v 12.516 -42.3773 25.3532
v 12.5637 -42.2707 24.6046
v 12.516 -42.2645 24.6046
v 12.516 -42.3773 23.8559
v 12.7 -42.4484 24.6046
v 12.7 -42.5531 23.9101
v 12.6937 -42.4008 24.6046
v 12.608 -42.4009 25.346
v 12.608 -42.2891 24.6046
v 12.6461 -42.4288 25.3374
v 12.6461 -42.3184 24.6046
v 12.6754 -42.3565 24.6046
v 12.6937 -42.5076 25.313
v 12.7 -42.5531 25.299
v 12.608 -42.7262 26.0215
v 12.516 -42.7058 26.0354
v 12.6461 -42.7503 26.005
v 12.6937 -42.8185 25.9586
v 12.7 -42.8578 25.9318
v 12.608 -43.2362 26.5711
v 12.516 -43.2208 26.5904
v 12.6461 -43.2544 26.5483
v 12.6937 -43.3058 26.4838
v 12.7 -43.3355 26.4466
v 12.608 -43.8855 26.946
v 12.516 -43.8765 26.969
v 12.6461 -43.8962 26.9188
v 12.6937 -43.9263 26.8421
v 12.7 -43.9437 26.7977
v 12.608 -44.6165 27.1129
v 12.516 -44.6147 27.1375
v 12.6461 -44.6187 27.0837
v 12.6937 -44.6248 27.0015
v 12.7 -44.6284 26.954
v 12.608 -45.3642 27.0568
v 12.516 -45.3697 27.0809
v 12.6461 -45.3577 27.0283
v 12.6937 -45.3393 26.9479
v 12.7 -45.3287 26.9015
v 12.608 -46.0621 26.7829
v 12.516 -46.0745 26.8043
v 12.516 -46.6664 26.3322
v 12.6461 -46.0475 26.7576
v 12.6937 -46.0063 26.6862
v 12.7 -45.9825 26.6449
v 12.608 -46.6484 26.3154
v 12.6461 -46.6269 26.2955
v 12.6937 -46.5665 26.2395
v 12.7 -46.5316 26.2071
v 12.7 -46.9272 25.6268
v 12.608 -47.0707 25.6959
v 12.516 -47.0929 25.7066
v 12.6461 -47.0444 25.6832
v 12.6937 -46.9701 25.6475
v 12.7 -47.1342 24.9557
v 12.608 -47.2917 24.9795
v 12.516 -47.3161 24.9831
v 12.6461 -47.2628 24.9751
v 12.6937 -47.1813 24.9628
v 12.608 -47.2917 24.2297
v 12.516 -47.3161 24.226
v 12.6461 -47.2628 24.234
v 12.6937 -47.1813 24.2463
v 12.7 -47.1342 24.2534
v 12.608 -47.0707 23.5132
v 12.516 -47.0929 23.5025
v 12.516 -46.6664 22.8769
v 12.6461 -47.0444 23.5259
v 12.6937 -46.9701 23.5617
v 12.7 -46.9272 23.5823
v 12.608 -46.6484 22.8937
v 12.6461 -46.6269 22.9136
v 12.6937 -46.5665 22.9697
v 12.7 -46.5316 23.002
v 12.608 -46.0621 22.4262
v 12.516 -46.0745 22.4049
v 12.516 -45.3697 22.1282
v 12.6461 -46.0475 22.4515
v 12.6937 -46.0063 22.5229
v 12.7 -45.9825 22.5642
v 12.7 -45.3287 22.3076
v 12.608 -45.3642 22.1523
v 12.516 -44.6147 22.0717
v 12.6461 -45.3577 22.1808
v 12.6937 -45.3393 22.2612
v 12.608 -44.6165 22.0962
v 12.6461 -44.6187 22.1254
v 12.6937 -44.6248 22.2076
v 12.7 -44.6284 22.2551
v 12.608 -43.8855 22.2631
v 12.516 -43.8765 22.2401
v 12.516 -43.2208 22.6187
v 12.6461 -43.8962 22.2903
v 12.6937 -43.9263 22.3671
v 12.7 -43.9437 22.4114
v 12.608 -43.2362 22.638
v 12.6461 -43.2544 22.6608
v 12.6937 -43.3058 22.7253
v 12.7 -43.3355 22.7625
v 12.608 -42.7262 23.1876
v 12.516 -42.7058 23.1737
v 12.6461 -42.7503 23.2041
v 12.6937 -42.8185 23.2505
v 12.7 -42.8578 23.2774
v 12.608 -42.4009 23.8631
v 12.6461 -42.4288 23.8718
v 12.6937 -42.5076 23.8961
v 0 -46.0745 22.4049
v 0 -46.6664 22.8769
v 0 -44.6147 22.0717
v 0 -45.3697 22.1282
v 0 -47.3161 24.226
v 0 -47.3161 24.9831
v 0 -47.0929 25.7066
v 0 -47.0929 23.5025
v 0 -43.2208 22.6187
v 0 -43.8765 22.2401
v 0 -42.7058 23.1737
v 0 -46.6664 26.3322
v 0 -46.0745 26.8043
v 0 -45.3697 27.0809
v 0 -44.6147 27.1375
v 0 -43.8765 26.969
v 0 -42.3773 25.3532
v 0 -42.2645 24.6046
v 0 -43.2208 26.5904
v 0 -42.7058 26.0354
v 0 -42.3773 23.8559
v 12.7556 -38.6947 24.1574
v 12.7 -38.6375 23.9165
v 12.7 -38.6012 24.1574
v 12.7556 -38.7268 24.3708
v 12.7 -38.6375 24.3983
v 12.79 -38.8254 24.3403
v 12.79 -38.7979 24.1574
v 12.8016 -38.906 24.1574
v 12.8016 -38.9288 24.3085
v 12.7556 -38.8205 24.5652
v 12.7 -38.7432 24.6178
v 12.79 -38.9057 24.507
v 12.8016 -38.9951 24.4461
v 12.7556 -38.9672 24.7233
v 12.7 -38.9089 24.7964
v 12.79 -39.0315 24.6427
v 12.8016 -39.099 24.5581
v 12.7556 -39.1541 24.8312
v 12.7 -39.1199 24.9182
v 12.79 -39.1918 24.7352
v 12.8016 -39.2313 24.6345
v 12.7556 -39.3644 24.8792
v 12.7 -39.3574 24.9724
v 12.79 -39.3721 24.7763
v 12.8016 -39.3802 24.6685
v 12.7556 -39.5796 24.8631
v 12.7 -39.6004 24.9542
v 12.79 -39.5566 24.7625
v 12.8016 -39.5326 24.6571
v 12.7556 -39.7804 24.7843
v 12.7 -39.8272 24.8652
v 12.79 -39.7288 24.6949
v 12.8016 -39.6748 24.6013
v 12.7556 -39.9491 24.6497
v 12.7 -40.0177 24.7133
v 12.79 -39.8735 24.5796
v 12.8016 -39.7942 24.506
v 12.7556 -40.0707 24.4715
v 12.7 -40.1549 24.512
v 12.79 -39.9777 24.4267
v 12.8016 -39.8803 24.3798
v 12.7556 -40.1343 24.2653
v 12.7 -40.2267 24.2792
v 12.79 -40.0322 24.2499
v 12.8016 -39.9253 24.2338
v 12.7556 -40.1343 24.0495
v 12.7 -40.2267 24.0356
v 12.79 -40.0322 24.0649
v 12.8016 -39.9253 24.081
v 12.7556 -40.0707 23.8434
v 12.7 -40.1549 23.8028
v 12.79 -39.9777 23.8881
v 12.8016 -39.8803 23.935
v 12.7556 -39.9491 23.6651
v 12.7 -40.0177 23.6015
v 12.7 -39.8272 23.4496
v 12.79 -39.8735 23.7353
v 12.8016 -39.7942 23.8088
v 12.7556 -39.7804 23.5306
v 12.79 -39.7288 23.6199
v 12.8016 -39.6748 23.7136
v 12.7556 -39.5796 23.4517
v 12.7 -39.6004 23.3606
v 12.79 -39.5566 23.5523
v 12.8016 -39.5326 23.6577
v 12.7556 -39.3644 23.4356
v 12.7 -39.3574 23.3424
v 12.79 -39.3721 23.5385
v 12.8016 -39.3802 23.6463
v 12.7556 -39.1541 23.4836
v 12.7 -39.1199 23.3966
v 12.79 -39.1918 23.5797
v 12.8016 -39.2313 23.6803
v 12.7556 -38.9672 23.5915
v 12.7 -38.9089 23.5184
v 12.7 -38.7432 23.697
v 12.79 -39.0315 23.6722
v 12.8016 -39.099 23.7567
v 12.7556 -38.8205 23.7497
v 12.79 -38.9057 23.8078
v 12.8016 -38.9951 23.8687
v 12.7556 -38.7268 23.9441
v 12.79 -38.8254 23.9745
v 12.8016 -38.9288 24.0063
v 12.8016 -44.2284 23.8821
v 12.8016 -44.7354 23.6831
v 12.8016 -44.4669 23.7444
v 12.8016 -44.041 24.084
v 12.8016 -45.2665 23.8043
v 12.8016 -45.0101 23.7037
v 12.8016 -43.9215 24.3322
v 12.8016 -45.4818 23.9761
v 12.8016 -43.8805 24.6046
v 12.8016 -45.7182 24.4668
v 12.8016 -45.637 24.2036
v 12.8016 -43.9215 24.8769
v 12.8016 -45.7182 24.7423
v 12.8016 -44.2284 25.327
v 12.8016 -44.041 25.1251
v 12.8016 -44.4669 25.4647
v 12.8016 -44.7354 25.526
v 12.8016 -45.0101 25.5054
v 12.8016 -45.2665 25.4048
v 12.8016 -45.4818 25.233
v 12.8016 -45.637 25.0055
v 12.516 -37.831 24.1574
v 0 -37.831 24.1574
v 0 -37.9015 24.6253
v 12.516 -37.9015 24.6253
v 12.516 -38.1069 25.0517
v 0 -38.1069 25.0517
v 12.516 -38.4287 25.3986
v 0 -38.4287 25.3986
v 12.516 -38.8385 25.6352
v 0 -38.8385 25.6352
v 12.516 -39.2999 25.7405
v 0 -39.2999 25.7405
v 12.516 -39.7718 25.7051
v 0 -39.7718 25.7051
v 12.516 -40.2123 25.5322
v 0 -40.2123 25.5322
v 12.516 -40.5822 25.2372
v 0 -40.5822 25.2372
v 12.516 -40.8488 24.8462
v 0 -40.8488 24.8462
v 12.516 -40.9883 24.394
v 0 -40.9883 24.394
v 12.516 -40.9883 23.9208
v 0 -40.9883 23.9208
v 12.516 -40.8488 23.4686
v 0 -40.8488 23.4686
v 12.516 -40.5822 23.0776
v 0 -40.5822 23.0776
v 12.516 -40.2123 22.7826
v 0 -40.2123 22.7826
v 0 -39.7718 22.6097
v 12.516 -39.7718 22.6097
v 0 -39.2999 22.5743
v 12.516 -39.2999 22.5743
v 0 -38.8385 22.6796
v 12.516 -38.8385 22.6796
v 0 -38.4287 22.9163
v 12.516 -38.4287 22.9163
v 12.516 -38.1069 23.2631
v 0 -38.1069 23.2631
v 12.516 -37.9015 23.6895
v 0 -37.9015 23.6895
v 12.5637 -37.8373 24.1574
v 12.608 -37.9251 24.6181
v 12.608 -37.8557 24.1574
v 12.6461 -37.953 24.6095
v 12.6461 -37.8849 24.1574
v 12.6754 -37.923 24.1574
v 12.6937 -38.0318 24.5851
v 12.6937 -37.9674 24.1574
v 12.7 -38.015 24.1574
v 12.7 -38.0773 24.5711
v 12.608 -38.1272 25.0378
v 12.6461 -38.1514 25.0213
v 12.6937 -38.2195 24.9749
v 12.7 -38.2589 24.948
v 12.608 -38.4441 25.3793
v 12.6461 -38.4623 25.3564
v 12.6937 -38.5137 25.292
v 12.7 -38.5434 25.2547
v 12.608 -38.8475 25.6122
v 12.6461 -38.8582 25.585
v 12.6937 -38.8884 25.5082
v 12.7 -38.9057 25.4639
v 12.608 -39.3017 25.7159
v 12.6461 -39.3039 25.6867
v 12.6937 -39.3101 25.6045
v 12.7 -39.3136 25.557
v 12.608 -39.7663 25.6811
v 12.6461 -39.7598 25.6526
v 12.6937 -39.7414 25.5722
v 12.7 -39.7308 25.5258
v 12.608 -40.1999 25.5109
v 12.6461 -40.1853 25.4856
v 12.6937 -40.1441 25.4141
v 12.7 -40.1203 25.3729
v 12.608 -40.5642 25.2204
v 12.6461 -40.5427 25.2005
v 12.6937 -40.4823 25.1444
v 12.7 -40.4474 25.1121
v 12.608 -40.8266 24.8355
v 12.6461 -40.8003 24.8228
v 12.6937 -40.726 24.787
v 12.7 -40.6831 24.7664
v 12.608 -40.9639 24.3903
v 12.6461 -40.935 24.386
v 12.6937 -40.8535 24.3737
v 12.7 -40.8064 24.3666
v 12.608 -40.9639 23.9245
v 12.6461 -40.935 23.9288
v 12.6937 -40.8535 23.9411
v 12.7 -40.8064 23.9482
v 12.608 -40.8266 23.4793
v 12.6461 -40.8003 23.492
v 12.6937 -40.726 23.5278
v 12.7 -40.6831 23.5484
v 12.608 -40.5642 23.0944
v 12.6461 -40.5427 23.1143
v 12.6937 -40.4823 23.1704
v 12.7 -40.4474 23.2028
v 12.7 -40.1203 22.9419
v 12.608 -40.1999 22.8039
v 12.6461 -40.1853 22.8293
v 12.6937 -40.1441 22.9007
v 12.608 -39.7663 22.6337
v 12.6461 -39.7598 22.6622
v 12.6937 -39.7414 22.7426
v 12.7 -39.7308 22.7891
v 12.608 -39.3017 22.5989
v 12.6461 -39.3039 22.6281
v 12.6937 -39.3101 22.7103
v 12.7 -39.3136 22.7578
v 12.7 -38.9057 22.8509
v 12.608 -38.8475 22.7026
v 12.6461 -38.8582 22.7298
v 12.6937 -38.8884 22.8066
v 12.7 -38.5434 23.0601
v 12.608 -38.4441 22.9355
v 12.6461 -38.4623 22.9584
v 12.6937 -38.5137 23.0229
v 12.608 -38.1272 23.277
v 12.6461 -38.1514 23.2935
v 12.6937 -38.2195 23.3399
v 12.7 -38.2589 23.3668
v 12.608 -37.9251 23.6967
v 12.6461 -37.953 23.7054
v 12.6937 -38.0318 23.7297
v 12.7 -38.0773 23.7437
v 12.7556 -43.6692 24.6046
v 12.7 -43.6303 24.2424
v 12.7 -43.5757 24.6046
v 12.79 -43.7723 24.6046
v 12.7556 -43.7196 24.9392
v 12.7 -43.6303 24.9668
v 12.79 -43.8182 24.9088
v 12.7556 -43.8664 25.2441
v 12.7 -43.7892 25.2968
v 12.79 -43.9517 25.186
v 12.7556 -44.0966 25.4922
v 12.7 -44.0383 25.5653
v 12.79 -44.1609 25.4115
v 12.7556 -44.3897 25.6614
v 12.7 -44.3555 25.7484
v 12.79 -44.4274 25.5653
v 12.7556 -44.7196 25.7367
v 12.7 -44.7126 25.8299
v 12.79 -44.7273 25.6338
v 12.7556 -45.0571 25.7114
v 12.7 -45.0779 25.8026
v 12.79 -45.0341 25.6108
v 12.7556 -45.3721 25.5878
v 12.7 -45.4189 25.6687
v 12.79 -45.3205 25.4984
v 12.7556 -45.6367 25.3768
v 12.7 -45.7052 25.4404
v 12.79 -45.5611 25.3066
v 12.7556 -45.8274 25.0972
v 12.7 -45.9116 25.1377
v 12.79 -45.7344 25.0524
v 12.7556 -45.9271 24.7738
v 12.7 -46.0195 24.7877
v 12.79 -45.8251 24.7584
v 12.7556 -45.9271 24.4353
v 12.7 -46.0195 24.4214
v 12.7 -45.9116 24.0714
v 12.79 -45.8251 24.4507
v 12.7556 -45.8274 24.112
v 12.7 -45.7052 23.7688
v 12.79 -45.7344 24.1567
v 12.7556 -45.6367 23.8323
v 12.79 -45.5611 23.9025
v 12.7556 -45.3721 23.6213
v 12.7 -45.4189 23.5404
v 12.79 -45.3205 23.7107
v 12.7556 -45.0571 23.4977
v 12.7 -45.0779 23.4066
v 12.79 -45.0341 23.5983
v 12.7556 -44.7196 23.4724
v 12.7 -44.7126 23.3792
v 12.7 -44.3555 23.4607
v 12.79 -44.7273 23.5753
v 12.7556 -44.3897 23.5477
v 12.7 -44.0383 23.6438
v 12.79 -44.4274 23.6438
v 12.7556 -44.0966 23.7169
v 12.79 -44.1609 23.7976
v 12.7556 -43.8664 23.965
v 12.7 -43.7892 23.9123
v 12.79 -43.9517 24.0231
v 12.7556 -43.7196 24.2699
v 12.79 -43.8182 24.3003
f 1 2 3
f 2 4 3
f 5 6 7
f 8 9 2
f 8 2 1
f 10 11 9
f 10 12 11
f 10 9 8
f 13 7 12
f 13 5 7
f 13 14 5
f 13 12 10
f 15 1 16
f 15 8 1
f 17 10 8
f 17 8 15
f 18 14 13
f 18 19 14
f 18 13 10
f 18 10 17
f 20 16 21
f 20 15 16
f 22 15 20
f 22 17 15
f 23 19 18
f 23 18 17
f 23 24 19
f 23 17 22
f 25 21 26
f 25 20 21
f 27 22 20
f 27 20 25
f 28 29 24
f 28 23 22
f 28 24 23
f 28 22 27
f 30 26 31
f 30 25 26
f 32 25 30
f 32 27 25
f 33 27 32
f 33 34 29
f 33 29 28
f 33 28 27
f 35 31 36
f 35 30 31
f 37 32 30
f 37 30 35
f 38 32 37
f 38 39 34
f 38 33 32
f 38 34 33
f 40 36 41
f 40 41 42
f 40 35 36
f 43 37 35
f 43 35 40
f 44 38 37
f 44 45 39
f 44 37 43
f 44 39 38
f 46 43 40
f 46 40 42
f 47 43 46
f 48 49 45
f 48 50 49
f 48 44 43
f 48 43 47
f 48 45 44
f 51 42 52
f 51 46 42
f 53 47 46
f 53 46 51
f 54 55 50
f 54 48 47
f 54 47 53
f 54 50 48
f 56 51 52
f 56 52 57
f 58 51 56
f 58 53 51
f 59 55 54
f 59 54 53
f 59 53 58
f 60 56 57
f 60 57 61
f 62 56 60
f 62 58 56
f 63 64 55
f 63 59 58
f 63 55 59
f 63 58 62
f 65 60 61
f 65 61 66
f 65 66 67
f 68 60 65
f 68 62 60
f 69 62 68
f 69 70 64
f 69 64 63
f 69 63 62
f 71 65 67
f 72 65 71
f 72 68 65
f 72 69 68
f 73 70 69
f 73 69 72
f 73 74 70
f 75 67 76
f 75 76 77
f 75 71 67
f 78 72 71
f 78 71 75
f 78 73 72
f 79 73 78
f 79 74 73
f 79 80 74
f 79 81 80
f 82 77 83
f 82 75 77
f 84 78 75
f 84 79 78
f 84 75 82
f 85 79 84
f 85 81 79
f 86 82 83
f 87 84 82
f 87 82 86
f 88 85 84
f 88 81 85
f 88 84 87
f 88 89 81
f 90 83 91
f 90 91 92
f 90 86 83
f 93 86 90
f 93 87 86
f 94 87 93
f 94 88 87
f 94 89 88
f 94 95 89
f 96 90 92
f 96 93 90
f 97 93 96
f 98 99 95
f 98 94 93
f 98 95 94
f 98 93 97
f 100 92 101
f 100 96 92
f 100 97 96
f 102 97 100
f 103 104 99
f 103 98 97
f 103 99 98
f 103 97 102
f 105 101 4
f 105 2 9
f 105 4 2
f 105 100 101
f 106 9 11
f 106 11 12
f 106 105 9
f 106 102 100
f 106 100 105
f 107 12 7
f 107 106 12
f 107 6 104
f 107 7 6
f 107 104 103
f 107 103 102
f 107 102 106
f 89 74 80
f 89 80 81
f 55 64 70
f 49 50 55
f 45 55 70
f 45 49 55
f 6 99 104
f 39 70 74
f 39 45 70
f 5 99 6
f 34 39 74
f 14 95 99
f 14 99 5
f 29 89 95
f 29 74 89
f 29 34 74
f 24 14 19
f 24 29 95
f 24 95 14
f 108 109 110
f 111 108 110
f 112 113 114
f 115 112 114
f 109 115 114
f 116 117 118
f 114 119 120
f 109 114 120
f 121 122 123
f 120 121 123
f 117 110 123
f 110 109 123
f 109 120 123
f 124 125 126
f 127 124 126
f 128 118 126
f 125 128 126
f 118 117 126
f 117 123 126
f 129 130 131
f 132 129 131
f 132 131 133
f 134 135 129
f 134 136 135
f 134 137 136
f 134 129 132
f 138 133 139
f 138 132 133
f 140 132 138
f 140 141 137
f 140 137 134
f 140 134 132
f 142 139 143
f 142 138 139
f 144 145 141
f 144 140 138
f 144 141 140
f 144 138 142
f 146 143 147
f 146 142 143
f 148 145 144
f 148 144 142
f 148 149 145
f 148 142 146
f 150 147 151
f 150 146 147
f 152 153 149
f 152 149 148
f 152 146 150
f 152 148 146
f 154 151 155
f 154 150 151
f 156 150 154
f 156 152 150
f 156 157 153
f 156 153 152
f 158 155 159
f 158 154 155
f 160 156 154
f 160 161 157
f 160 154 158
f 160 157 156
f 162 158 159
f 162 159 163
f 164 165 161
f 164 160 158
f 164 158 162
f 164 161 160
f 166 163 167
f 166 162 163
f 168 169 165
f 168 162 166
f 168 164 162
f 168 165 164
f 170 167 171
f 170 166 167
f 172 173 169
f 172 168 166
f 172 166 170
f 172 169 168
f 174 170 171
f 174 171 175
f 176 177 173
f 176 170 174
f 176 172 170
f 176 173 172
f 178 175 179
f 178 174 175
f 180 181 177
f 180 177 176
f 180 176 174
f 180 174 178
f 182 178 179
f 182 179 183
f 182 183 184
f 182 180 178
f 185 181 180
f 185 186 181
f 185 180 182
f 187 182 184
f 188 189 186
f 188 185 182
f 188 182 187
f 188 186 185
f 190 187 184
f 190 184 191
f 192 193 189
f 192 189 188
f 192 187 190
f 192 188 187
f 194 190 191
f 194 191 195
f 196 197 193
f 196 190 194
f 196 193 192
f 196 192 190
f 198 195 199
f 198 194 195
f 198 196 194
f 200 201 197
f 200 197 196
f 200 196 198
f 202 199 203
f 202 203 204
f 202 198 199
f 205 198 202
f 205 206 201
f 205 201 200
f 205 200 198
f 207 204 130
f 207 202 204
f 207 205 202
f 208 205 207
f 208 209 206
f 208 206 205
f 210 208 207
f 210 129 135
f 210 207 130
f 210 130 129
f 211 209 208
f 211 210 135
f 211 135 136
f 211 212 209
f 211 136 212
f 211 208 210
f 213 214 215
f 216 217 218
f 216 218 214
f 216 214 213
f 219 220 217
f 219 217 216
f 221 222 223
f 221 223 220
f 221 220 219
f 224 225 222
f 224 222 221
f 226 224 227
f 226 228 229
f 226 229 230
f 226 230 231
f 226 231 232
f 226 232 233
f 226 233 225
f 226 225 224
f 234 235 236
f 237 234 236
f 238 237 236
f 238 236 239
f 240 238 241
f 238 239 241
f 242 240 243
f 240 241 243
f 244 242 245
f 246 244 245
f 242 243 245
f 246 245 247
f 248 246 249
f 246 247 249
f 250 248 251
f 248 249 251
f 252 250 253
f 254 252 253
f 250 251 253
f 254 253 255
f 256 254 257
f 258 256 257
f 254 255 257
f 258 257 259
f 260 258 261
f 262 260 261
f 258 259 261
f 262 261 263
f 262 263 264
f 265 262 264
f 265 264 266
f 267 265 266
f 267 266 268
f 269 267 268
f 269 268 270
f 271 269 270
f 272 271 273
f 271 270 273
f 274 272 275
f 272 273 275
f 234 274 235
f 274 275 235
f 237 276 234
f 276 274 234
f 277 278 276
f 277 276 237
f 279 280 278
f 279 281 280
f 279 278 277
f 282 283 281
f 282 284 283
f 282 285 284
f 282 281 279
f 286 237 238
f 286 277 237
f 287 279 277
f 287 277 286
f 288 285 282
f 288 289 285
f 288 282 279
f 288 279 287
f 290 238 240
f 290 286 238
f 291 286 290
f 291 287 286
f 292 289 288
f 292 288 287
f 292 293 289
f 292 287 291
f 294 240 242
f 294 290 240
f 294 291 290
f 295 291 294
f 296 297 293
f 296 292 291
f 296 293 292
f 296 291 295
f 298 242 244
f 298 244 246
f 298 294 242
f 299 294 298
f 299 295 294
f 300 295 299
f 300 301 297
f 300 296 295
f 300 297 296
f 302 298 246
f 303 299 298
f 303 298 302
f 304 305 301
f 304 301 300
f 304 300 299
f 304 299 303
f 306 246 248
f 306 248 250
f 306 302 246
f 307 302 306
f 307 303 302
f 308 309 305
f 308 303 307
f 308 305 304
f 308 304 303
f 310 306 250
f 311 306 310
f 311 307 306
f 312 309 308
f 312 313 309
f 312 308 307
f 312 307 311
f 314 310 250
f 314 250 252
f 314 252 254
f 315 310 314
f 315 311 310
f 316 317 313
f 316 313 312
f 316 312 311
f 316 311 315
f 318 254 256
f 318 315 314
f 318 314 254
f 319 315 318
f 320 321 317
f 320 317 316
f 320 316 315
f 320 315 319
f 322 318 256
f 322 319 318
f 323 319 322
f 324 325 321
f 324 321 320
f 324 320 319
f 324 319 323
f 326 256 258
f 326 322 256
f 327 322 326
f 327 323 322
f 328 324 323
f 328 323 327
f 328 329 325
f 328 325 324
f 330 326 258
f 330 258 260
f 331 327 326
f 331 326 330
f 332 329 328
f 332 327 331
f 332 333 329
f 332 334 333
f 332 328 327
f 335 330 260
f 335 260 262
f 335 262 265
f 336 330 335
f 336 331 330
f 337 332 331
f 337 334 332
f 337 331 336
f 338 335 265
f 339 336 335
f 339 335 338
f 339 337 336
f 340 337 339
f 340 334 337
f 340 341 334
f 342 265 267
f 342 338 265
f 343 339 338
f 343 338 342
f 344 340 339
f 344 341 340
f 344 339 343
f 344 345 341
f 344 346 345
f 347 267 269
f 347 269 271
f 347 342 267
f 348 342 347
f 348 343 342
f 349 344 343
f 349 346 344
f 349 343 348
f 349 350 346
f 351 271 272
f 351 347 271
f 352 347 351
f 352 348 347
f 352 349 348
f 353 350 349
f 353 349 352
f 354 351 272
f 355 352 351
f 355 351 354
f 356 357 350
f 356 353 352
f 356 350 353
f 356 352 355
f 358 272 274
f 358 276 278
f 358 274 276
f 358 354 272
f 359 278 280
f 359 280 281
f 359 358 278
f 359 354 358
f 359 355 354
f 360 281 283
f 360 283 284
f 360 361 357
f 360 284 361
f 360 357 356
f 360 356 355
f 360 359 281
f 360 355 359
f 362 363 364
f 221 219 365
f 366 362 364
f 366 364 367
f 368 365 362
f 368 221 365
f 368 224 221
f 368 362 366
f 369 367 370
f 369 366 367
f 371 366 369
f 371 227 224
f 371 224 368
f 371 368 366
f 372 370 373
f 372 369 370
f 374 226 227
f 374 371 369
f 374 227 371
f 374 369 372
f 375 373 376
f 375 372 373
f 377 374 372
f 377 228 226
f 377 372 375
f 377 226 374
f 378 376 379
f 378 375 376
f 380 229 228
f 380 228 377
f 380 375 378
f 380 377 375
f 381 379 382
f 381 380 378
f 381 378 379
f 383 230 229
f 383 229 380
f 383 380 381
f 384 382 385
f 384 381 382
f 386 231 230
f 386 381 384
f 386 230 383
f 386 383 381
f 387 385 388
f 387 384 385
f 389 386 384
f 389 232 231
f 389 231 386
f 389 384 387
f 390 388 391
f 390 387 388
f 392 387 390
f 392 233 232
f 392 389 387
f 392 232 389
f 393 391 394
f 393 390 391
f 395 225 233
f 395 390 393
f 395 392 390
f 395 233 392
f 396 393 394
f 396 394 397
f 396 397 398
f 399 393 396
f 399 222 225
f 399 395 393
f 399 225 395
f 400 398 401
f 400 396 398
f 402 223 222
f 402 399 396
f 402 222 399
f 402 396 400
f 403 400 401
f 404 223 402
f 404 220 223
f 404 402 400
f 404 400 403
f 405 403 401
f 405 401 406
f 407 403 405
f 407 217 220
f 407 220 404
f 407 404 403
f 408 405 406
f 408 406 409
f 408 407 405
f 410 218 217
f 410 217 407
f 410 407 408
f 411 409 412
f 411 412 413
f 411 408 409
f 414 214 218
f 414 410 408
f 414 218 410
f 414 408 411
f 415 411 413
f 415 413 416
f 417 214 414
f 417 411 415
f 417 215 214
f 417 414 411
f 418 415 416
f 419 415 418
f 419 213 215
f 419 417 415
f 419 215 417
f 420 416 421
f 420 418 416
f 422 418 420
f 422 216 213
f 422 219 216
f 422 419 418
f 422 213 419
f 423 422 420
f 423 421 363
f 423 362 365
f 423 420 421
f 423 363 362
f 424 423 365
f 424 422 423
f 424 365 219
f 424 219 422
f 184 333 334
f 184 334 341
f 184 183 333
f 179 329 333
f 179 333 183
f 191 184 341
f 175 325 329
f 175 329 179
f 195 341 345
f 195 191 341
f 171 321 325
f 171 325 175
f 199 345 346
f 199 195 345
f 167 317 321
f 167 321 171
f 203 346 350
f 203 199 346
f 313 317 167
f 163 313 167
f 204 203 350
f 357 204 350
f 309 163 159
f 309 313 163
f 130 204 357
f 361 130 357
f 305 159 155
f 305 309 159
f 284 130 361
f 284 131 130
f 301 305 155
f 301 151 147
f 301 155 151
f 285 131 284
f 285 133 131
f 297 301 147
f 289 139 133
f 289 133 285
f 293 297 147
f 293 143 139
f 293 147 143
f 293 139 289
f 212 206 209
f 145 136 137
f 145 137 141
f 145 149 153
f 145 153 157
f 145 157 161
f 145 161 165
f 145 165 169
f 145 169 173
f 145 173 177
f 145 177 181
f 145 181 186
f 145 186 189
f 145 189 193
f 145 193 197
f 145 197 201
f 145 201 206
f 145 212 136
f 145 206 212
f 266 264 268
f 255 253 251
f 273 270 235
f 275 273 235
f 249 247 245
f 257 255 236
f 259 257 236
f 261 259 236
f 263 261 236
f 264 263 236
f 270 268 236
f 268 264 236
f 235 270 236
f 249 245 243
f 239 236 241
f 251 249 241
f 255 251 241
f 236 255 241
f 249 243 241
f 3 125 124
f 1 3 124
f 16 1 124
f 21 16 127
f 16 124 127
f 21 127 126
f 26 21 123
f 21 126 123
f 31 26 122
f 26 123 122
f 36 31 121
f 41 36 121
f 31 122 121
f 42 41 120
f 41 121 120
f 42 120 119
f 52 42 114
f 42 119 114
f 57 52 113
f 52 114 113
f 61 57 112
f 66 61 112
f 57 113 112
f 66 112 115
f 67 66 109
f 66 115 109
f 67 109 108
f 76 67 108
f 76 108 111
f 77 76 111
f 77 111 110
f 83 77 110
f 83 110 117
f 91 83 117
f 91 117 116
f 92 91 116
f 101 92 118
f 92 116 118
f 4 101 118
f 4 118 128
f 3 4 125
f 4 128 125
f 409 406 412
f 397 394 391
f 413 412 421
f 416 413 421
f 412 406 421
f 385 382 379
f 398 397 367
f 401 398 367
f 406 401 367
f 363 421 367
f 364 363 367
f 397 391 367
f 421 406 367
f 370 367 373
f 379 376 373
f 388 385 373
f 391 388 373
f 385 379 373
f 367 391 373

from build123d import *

# Parameters (mm, degrees)
F0_R     = 2.54
F1_DEPTH = 12.7
F0_R_2   = 1.5875
F2_R     = 0.1839630735
F2_2_R   = 0.1839630735
F3_R     = 1.2288024755
F4_DEPTH = 0.1016
F5_R     = 0.8173198651
F6_DEPTH = 0.1016


# Not quite as in the source:
# - a fillet or chamfer that OpenCascade refuses, or shapes differently, is made with other operations: its cross-section is extruded or revolved along the edge and cut away or added
# - a feature names something its author has since deleted; it is built from what else it names


with BuildPart() as f1:
    # F0 (on Right) → F1 (new body)
    with BuildSketch(Plane.YZ):
        with Locations((-44.8044711261, 24.6045570821)):
            Circle(F0_R)
    extrude(amount=F1_DEPTH)

    # F2
    f2_edges = [f1.edges().sort_by_distance(p)[0] for p in [
        (12.7, -47.344471, 24.604557),
    ]]
    fillet(f2_edges, radius=F2_R)


with BuildPart() as f1b:
    # F0 (on Right) → F1, piece 2 (new body)
    with BuildSketch(Plane.YZ):
        with Locations((-39.4185185432, 24.1574086249)):
            Circle(F0_R_2)
    extrude(amount=F1_DEPTH)

    # F2#2
    f2_2_edges = [f1b.edges().sort_by_distance(p)[0] for p in [
        (12.7, -41.006019, 24.157409),
    ]]
    fillet(f2_2_edges, radius=F2_2_R)

    # F5 (on face) → F6 (join)
    with BuildSketch(Plane.YZ.offset(12.7)):
        with Locations((-39.4185185432, 24.1574086249)):
            Circle(F5_R)
    extrude(amount=F6_DEPTH)

    # F7: fillet of radius 0.508 on 1 edges, made by hand

    # F7_s1 → F7_t2 (revolve, cut)
    with BuildSketch(Plane.XY.offset(24.1574086249)):
        with BuildLine():
            ThreePointArc((12.7, -38.6011986781), (12.7755311154, -38.745354973), (12.8016, -38.9059986781))
            Line((12.8016, -38.9059986781), (12.8016, -38.6011986781))
            Line((12.8016, -38.6011986781), (12.7, -38.6011986781))
        make_face()
    revolve(axis=Axis((12.8016, -39.4185185432, 24.1574086249), (1, 0, 0)), mode=Mode.SUBTRACT)


with BuildPart() as f4:
    # F3 (on face) → F4 (new body)
    with BuildSketch(Plane.YZ.offset(12.7)):
        with Locations((-44.8044711261, 24.6045570821)):
            Circle(F3_R)
    extrude(amount=F4_DEPTH)

    # F7#2: fillet of radius 0.508 on 1 edges, made by hand

    # F7_2_s1 → F7_2_t2 (revolve, cut)
    with BuildSketch(Plane.XY.offset(24.6045570821)):
        with BuildLine():
            ThreePointArc((12.7, -43.5756686507), (12.7755311154, -43.7198249455), (12.8016, -43.8804686507))
            Line((12.8016, -43.8804686507), (12.8016, -43.5756686507))
            Line((12.8016, -43.5756686507), (12.7, -43.5756686507))
        make_face()
    revolve(axis=Axis((12.8016, -44.8044711261, 24.6045570821), (1, 0, 0)), mode=Mode.SUBTRACT)


solid = Compound([f1.part, f1b.part, f4.part])
